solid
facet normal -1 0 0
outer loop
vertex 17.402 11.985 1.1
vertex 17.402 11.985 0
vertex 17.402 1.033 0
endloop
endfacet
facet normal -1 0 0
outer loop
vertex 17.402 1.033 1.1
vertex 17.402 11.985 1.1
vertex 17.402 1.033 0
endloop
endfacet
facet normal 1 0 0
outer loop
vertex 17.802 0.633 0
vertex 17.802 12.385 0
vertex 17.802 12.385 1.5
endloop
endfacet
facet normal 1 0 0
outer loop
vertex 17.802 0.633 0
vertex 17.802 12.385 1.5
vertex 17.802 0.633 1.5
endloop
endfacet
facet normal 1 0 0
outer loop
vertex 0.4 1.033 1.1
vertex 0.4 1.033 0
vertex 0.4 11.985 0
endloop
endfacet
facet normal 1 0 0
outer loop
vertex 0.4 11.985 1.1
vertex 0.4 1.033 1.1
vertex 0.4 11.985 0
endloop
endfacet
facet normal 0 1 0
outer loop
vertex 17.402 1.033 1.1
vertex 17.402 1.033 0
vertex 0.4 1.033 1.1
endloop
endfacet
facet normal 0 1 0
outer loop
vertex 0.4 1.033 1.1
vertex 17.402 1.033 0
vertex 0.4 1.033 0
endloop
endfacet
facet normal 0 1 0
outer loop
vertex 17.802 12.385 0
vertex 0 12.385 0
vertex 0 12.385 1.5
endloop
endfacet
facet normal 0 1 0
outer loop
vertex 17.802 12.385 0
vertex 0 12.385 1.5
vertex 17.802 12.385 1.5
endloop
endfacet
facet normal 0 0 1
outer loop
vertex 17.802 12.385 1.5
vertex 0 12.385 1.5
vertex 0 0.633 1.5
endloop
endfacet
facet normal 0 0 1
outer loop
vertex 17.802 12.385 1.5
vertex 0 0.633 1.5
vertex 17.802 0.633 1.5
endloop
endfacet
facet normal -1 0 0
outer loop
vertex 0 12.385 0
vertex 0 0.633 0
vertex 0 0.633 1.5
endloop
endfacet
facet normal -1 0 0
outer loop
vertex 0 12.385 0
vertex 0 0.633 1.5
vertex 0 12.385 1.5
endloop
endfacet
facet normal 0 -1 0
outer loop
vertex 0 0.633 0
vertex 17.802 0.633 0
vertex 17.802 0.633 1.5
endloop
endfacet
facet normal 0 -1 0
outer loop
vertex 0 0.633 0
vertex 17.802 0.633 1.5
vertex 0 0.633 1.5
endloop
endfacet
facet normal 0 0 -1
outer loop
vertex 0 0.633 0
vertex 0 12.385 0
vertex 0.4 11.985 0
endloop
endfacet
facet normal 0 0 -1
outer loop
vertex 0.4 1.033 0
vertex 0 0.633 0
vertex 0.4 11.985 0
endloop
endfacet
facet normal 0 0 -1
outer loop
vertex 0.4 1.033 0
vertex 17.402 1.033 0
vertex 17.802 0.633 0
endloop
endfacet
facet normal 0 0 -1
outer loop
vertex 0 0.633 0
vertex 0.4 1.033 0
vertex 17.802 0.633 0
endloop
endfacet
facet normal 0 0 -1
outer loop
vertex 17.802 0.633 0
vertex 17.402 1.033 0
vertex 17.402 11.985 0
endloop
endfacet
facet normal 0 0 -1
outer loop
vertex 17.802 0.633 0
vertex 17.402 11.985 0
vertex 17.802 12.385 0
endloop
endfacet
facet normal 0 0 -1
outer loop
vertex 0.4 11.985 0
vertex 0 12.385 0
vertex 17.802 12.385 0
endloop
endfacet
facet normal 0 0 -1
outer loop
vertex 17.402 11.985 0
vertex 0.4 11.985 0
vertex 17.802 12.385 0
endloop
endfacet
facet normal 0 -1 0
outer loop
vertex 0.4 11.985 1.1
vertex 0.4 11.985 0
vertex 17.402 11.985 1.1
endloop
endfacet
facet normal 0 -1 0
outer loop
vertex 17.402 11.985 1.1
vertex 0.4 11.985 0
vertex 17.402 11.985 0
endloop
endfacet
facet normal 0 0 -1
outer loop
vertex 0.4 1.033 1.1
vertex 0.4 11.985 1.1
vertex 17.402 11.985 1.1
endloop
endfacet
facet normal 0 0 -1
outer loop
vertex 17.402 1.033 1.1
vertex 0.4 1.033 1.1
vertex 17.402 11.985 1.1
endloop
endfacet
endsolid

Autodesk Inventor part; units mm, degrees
ref_plane "YZ Plane" through (0, 0, 0) normal (1, 0, 0) x (0, 1, 0)
ref_plane "XZ Plane" through (0, 0, 0) normal (0, 1, 0) x (-1, 0, 0)
ref_plane "XY Plane" through (0, 0, 0) normal (0, 0, 1) x (1, 0, 0)
sketch "Sketch1" plane through (0, 0, 0) normal (0, 0, 1) x (1, 0, 0)
  line L0 (0, 12.3846) -> (17.8016, 12.3846)
  line L1 (17.8016, 12.3846) -> (17.8016, 0.6334)
  line L2 (17.8016, 0.6334) -> (0, 0.6334)
  line L3 (0, 0.6334) -> (0, 12.3846)
  point P0 (0, 0)
extrude "Extrusion1" add sketch "Sketch1" along normal blind 1.5
shell "Shell1" thickness 0.4 removed faces 1 at (5.9339, 8.4676, 0)
properties part number "a4"
